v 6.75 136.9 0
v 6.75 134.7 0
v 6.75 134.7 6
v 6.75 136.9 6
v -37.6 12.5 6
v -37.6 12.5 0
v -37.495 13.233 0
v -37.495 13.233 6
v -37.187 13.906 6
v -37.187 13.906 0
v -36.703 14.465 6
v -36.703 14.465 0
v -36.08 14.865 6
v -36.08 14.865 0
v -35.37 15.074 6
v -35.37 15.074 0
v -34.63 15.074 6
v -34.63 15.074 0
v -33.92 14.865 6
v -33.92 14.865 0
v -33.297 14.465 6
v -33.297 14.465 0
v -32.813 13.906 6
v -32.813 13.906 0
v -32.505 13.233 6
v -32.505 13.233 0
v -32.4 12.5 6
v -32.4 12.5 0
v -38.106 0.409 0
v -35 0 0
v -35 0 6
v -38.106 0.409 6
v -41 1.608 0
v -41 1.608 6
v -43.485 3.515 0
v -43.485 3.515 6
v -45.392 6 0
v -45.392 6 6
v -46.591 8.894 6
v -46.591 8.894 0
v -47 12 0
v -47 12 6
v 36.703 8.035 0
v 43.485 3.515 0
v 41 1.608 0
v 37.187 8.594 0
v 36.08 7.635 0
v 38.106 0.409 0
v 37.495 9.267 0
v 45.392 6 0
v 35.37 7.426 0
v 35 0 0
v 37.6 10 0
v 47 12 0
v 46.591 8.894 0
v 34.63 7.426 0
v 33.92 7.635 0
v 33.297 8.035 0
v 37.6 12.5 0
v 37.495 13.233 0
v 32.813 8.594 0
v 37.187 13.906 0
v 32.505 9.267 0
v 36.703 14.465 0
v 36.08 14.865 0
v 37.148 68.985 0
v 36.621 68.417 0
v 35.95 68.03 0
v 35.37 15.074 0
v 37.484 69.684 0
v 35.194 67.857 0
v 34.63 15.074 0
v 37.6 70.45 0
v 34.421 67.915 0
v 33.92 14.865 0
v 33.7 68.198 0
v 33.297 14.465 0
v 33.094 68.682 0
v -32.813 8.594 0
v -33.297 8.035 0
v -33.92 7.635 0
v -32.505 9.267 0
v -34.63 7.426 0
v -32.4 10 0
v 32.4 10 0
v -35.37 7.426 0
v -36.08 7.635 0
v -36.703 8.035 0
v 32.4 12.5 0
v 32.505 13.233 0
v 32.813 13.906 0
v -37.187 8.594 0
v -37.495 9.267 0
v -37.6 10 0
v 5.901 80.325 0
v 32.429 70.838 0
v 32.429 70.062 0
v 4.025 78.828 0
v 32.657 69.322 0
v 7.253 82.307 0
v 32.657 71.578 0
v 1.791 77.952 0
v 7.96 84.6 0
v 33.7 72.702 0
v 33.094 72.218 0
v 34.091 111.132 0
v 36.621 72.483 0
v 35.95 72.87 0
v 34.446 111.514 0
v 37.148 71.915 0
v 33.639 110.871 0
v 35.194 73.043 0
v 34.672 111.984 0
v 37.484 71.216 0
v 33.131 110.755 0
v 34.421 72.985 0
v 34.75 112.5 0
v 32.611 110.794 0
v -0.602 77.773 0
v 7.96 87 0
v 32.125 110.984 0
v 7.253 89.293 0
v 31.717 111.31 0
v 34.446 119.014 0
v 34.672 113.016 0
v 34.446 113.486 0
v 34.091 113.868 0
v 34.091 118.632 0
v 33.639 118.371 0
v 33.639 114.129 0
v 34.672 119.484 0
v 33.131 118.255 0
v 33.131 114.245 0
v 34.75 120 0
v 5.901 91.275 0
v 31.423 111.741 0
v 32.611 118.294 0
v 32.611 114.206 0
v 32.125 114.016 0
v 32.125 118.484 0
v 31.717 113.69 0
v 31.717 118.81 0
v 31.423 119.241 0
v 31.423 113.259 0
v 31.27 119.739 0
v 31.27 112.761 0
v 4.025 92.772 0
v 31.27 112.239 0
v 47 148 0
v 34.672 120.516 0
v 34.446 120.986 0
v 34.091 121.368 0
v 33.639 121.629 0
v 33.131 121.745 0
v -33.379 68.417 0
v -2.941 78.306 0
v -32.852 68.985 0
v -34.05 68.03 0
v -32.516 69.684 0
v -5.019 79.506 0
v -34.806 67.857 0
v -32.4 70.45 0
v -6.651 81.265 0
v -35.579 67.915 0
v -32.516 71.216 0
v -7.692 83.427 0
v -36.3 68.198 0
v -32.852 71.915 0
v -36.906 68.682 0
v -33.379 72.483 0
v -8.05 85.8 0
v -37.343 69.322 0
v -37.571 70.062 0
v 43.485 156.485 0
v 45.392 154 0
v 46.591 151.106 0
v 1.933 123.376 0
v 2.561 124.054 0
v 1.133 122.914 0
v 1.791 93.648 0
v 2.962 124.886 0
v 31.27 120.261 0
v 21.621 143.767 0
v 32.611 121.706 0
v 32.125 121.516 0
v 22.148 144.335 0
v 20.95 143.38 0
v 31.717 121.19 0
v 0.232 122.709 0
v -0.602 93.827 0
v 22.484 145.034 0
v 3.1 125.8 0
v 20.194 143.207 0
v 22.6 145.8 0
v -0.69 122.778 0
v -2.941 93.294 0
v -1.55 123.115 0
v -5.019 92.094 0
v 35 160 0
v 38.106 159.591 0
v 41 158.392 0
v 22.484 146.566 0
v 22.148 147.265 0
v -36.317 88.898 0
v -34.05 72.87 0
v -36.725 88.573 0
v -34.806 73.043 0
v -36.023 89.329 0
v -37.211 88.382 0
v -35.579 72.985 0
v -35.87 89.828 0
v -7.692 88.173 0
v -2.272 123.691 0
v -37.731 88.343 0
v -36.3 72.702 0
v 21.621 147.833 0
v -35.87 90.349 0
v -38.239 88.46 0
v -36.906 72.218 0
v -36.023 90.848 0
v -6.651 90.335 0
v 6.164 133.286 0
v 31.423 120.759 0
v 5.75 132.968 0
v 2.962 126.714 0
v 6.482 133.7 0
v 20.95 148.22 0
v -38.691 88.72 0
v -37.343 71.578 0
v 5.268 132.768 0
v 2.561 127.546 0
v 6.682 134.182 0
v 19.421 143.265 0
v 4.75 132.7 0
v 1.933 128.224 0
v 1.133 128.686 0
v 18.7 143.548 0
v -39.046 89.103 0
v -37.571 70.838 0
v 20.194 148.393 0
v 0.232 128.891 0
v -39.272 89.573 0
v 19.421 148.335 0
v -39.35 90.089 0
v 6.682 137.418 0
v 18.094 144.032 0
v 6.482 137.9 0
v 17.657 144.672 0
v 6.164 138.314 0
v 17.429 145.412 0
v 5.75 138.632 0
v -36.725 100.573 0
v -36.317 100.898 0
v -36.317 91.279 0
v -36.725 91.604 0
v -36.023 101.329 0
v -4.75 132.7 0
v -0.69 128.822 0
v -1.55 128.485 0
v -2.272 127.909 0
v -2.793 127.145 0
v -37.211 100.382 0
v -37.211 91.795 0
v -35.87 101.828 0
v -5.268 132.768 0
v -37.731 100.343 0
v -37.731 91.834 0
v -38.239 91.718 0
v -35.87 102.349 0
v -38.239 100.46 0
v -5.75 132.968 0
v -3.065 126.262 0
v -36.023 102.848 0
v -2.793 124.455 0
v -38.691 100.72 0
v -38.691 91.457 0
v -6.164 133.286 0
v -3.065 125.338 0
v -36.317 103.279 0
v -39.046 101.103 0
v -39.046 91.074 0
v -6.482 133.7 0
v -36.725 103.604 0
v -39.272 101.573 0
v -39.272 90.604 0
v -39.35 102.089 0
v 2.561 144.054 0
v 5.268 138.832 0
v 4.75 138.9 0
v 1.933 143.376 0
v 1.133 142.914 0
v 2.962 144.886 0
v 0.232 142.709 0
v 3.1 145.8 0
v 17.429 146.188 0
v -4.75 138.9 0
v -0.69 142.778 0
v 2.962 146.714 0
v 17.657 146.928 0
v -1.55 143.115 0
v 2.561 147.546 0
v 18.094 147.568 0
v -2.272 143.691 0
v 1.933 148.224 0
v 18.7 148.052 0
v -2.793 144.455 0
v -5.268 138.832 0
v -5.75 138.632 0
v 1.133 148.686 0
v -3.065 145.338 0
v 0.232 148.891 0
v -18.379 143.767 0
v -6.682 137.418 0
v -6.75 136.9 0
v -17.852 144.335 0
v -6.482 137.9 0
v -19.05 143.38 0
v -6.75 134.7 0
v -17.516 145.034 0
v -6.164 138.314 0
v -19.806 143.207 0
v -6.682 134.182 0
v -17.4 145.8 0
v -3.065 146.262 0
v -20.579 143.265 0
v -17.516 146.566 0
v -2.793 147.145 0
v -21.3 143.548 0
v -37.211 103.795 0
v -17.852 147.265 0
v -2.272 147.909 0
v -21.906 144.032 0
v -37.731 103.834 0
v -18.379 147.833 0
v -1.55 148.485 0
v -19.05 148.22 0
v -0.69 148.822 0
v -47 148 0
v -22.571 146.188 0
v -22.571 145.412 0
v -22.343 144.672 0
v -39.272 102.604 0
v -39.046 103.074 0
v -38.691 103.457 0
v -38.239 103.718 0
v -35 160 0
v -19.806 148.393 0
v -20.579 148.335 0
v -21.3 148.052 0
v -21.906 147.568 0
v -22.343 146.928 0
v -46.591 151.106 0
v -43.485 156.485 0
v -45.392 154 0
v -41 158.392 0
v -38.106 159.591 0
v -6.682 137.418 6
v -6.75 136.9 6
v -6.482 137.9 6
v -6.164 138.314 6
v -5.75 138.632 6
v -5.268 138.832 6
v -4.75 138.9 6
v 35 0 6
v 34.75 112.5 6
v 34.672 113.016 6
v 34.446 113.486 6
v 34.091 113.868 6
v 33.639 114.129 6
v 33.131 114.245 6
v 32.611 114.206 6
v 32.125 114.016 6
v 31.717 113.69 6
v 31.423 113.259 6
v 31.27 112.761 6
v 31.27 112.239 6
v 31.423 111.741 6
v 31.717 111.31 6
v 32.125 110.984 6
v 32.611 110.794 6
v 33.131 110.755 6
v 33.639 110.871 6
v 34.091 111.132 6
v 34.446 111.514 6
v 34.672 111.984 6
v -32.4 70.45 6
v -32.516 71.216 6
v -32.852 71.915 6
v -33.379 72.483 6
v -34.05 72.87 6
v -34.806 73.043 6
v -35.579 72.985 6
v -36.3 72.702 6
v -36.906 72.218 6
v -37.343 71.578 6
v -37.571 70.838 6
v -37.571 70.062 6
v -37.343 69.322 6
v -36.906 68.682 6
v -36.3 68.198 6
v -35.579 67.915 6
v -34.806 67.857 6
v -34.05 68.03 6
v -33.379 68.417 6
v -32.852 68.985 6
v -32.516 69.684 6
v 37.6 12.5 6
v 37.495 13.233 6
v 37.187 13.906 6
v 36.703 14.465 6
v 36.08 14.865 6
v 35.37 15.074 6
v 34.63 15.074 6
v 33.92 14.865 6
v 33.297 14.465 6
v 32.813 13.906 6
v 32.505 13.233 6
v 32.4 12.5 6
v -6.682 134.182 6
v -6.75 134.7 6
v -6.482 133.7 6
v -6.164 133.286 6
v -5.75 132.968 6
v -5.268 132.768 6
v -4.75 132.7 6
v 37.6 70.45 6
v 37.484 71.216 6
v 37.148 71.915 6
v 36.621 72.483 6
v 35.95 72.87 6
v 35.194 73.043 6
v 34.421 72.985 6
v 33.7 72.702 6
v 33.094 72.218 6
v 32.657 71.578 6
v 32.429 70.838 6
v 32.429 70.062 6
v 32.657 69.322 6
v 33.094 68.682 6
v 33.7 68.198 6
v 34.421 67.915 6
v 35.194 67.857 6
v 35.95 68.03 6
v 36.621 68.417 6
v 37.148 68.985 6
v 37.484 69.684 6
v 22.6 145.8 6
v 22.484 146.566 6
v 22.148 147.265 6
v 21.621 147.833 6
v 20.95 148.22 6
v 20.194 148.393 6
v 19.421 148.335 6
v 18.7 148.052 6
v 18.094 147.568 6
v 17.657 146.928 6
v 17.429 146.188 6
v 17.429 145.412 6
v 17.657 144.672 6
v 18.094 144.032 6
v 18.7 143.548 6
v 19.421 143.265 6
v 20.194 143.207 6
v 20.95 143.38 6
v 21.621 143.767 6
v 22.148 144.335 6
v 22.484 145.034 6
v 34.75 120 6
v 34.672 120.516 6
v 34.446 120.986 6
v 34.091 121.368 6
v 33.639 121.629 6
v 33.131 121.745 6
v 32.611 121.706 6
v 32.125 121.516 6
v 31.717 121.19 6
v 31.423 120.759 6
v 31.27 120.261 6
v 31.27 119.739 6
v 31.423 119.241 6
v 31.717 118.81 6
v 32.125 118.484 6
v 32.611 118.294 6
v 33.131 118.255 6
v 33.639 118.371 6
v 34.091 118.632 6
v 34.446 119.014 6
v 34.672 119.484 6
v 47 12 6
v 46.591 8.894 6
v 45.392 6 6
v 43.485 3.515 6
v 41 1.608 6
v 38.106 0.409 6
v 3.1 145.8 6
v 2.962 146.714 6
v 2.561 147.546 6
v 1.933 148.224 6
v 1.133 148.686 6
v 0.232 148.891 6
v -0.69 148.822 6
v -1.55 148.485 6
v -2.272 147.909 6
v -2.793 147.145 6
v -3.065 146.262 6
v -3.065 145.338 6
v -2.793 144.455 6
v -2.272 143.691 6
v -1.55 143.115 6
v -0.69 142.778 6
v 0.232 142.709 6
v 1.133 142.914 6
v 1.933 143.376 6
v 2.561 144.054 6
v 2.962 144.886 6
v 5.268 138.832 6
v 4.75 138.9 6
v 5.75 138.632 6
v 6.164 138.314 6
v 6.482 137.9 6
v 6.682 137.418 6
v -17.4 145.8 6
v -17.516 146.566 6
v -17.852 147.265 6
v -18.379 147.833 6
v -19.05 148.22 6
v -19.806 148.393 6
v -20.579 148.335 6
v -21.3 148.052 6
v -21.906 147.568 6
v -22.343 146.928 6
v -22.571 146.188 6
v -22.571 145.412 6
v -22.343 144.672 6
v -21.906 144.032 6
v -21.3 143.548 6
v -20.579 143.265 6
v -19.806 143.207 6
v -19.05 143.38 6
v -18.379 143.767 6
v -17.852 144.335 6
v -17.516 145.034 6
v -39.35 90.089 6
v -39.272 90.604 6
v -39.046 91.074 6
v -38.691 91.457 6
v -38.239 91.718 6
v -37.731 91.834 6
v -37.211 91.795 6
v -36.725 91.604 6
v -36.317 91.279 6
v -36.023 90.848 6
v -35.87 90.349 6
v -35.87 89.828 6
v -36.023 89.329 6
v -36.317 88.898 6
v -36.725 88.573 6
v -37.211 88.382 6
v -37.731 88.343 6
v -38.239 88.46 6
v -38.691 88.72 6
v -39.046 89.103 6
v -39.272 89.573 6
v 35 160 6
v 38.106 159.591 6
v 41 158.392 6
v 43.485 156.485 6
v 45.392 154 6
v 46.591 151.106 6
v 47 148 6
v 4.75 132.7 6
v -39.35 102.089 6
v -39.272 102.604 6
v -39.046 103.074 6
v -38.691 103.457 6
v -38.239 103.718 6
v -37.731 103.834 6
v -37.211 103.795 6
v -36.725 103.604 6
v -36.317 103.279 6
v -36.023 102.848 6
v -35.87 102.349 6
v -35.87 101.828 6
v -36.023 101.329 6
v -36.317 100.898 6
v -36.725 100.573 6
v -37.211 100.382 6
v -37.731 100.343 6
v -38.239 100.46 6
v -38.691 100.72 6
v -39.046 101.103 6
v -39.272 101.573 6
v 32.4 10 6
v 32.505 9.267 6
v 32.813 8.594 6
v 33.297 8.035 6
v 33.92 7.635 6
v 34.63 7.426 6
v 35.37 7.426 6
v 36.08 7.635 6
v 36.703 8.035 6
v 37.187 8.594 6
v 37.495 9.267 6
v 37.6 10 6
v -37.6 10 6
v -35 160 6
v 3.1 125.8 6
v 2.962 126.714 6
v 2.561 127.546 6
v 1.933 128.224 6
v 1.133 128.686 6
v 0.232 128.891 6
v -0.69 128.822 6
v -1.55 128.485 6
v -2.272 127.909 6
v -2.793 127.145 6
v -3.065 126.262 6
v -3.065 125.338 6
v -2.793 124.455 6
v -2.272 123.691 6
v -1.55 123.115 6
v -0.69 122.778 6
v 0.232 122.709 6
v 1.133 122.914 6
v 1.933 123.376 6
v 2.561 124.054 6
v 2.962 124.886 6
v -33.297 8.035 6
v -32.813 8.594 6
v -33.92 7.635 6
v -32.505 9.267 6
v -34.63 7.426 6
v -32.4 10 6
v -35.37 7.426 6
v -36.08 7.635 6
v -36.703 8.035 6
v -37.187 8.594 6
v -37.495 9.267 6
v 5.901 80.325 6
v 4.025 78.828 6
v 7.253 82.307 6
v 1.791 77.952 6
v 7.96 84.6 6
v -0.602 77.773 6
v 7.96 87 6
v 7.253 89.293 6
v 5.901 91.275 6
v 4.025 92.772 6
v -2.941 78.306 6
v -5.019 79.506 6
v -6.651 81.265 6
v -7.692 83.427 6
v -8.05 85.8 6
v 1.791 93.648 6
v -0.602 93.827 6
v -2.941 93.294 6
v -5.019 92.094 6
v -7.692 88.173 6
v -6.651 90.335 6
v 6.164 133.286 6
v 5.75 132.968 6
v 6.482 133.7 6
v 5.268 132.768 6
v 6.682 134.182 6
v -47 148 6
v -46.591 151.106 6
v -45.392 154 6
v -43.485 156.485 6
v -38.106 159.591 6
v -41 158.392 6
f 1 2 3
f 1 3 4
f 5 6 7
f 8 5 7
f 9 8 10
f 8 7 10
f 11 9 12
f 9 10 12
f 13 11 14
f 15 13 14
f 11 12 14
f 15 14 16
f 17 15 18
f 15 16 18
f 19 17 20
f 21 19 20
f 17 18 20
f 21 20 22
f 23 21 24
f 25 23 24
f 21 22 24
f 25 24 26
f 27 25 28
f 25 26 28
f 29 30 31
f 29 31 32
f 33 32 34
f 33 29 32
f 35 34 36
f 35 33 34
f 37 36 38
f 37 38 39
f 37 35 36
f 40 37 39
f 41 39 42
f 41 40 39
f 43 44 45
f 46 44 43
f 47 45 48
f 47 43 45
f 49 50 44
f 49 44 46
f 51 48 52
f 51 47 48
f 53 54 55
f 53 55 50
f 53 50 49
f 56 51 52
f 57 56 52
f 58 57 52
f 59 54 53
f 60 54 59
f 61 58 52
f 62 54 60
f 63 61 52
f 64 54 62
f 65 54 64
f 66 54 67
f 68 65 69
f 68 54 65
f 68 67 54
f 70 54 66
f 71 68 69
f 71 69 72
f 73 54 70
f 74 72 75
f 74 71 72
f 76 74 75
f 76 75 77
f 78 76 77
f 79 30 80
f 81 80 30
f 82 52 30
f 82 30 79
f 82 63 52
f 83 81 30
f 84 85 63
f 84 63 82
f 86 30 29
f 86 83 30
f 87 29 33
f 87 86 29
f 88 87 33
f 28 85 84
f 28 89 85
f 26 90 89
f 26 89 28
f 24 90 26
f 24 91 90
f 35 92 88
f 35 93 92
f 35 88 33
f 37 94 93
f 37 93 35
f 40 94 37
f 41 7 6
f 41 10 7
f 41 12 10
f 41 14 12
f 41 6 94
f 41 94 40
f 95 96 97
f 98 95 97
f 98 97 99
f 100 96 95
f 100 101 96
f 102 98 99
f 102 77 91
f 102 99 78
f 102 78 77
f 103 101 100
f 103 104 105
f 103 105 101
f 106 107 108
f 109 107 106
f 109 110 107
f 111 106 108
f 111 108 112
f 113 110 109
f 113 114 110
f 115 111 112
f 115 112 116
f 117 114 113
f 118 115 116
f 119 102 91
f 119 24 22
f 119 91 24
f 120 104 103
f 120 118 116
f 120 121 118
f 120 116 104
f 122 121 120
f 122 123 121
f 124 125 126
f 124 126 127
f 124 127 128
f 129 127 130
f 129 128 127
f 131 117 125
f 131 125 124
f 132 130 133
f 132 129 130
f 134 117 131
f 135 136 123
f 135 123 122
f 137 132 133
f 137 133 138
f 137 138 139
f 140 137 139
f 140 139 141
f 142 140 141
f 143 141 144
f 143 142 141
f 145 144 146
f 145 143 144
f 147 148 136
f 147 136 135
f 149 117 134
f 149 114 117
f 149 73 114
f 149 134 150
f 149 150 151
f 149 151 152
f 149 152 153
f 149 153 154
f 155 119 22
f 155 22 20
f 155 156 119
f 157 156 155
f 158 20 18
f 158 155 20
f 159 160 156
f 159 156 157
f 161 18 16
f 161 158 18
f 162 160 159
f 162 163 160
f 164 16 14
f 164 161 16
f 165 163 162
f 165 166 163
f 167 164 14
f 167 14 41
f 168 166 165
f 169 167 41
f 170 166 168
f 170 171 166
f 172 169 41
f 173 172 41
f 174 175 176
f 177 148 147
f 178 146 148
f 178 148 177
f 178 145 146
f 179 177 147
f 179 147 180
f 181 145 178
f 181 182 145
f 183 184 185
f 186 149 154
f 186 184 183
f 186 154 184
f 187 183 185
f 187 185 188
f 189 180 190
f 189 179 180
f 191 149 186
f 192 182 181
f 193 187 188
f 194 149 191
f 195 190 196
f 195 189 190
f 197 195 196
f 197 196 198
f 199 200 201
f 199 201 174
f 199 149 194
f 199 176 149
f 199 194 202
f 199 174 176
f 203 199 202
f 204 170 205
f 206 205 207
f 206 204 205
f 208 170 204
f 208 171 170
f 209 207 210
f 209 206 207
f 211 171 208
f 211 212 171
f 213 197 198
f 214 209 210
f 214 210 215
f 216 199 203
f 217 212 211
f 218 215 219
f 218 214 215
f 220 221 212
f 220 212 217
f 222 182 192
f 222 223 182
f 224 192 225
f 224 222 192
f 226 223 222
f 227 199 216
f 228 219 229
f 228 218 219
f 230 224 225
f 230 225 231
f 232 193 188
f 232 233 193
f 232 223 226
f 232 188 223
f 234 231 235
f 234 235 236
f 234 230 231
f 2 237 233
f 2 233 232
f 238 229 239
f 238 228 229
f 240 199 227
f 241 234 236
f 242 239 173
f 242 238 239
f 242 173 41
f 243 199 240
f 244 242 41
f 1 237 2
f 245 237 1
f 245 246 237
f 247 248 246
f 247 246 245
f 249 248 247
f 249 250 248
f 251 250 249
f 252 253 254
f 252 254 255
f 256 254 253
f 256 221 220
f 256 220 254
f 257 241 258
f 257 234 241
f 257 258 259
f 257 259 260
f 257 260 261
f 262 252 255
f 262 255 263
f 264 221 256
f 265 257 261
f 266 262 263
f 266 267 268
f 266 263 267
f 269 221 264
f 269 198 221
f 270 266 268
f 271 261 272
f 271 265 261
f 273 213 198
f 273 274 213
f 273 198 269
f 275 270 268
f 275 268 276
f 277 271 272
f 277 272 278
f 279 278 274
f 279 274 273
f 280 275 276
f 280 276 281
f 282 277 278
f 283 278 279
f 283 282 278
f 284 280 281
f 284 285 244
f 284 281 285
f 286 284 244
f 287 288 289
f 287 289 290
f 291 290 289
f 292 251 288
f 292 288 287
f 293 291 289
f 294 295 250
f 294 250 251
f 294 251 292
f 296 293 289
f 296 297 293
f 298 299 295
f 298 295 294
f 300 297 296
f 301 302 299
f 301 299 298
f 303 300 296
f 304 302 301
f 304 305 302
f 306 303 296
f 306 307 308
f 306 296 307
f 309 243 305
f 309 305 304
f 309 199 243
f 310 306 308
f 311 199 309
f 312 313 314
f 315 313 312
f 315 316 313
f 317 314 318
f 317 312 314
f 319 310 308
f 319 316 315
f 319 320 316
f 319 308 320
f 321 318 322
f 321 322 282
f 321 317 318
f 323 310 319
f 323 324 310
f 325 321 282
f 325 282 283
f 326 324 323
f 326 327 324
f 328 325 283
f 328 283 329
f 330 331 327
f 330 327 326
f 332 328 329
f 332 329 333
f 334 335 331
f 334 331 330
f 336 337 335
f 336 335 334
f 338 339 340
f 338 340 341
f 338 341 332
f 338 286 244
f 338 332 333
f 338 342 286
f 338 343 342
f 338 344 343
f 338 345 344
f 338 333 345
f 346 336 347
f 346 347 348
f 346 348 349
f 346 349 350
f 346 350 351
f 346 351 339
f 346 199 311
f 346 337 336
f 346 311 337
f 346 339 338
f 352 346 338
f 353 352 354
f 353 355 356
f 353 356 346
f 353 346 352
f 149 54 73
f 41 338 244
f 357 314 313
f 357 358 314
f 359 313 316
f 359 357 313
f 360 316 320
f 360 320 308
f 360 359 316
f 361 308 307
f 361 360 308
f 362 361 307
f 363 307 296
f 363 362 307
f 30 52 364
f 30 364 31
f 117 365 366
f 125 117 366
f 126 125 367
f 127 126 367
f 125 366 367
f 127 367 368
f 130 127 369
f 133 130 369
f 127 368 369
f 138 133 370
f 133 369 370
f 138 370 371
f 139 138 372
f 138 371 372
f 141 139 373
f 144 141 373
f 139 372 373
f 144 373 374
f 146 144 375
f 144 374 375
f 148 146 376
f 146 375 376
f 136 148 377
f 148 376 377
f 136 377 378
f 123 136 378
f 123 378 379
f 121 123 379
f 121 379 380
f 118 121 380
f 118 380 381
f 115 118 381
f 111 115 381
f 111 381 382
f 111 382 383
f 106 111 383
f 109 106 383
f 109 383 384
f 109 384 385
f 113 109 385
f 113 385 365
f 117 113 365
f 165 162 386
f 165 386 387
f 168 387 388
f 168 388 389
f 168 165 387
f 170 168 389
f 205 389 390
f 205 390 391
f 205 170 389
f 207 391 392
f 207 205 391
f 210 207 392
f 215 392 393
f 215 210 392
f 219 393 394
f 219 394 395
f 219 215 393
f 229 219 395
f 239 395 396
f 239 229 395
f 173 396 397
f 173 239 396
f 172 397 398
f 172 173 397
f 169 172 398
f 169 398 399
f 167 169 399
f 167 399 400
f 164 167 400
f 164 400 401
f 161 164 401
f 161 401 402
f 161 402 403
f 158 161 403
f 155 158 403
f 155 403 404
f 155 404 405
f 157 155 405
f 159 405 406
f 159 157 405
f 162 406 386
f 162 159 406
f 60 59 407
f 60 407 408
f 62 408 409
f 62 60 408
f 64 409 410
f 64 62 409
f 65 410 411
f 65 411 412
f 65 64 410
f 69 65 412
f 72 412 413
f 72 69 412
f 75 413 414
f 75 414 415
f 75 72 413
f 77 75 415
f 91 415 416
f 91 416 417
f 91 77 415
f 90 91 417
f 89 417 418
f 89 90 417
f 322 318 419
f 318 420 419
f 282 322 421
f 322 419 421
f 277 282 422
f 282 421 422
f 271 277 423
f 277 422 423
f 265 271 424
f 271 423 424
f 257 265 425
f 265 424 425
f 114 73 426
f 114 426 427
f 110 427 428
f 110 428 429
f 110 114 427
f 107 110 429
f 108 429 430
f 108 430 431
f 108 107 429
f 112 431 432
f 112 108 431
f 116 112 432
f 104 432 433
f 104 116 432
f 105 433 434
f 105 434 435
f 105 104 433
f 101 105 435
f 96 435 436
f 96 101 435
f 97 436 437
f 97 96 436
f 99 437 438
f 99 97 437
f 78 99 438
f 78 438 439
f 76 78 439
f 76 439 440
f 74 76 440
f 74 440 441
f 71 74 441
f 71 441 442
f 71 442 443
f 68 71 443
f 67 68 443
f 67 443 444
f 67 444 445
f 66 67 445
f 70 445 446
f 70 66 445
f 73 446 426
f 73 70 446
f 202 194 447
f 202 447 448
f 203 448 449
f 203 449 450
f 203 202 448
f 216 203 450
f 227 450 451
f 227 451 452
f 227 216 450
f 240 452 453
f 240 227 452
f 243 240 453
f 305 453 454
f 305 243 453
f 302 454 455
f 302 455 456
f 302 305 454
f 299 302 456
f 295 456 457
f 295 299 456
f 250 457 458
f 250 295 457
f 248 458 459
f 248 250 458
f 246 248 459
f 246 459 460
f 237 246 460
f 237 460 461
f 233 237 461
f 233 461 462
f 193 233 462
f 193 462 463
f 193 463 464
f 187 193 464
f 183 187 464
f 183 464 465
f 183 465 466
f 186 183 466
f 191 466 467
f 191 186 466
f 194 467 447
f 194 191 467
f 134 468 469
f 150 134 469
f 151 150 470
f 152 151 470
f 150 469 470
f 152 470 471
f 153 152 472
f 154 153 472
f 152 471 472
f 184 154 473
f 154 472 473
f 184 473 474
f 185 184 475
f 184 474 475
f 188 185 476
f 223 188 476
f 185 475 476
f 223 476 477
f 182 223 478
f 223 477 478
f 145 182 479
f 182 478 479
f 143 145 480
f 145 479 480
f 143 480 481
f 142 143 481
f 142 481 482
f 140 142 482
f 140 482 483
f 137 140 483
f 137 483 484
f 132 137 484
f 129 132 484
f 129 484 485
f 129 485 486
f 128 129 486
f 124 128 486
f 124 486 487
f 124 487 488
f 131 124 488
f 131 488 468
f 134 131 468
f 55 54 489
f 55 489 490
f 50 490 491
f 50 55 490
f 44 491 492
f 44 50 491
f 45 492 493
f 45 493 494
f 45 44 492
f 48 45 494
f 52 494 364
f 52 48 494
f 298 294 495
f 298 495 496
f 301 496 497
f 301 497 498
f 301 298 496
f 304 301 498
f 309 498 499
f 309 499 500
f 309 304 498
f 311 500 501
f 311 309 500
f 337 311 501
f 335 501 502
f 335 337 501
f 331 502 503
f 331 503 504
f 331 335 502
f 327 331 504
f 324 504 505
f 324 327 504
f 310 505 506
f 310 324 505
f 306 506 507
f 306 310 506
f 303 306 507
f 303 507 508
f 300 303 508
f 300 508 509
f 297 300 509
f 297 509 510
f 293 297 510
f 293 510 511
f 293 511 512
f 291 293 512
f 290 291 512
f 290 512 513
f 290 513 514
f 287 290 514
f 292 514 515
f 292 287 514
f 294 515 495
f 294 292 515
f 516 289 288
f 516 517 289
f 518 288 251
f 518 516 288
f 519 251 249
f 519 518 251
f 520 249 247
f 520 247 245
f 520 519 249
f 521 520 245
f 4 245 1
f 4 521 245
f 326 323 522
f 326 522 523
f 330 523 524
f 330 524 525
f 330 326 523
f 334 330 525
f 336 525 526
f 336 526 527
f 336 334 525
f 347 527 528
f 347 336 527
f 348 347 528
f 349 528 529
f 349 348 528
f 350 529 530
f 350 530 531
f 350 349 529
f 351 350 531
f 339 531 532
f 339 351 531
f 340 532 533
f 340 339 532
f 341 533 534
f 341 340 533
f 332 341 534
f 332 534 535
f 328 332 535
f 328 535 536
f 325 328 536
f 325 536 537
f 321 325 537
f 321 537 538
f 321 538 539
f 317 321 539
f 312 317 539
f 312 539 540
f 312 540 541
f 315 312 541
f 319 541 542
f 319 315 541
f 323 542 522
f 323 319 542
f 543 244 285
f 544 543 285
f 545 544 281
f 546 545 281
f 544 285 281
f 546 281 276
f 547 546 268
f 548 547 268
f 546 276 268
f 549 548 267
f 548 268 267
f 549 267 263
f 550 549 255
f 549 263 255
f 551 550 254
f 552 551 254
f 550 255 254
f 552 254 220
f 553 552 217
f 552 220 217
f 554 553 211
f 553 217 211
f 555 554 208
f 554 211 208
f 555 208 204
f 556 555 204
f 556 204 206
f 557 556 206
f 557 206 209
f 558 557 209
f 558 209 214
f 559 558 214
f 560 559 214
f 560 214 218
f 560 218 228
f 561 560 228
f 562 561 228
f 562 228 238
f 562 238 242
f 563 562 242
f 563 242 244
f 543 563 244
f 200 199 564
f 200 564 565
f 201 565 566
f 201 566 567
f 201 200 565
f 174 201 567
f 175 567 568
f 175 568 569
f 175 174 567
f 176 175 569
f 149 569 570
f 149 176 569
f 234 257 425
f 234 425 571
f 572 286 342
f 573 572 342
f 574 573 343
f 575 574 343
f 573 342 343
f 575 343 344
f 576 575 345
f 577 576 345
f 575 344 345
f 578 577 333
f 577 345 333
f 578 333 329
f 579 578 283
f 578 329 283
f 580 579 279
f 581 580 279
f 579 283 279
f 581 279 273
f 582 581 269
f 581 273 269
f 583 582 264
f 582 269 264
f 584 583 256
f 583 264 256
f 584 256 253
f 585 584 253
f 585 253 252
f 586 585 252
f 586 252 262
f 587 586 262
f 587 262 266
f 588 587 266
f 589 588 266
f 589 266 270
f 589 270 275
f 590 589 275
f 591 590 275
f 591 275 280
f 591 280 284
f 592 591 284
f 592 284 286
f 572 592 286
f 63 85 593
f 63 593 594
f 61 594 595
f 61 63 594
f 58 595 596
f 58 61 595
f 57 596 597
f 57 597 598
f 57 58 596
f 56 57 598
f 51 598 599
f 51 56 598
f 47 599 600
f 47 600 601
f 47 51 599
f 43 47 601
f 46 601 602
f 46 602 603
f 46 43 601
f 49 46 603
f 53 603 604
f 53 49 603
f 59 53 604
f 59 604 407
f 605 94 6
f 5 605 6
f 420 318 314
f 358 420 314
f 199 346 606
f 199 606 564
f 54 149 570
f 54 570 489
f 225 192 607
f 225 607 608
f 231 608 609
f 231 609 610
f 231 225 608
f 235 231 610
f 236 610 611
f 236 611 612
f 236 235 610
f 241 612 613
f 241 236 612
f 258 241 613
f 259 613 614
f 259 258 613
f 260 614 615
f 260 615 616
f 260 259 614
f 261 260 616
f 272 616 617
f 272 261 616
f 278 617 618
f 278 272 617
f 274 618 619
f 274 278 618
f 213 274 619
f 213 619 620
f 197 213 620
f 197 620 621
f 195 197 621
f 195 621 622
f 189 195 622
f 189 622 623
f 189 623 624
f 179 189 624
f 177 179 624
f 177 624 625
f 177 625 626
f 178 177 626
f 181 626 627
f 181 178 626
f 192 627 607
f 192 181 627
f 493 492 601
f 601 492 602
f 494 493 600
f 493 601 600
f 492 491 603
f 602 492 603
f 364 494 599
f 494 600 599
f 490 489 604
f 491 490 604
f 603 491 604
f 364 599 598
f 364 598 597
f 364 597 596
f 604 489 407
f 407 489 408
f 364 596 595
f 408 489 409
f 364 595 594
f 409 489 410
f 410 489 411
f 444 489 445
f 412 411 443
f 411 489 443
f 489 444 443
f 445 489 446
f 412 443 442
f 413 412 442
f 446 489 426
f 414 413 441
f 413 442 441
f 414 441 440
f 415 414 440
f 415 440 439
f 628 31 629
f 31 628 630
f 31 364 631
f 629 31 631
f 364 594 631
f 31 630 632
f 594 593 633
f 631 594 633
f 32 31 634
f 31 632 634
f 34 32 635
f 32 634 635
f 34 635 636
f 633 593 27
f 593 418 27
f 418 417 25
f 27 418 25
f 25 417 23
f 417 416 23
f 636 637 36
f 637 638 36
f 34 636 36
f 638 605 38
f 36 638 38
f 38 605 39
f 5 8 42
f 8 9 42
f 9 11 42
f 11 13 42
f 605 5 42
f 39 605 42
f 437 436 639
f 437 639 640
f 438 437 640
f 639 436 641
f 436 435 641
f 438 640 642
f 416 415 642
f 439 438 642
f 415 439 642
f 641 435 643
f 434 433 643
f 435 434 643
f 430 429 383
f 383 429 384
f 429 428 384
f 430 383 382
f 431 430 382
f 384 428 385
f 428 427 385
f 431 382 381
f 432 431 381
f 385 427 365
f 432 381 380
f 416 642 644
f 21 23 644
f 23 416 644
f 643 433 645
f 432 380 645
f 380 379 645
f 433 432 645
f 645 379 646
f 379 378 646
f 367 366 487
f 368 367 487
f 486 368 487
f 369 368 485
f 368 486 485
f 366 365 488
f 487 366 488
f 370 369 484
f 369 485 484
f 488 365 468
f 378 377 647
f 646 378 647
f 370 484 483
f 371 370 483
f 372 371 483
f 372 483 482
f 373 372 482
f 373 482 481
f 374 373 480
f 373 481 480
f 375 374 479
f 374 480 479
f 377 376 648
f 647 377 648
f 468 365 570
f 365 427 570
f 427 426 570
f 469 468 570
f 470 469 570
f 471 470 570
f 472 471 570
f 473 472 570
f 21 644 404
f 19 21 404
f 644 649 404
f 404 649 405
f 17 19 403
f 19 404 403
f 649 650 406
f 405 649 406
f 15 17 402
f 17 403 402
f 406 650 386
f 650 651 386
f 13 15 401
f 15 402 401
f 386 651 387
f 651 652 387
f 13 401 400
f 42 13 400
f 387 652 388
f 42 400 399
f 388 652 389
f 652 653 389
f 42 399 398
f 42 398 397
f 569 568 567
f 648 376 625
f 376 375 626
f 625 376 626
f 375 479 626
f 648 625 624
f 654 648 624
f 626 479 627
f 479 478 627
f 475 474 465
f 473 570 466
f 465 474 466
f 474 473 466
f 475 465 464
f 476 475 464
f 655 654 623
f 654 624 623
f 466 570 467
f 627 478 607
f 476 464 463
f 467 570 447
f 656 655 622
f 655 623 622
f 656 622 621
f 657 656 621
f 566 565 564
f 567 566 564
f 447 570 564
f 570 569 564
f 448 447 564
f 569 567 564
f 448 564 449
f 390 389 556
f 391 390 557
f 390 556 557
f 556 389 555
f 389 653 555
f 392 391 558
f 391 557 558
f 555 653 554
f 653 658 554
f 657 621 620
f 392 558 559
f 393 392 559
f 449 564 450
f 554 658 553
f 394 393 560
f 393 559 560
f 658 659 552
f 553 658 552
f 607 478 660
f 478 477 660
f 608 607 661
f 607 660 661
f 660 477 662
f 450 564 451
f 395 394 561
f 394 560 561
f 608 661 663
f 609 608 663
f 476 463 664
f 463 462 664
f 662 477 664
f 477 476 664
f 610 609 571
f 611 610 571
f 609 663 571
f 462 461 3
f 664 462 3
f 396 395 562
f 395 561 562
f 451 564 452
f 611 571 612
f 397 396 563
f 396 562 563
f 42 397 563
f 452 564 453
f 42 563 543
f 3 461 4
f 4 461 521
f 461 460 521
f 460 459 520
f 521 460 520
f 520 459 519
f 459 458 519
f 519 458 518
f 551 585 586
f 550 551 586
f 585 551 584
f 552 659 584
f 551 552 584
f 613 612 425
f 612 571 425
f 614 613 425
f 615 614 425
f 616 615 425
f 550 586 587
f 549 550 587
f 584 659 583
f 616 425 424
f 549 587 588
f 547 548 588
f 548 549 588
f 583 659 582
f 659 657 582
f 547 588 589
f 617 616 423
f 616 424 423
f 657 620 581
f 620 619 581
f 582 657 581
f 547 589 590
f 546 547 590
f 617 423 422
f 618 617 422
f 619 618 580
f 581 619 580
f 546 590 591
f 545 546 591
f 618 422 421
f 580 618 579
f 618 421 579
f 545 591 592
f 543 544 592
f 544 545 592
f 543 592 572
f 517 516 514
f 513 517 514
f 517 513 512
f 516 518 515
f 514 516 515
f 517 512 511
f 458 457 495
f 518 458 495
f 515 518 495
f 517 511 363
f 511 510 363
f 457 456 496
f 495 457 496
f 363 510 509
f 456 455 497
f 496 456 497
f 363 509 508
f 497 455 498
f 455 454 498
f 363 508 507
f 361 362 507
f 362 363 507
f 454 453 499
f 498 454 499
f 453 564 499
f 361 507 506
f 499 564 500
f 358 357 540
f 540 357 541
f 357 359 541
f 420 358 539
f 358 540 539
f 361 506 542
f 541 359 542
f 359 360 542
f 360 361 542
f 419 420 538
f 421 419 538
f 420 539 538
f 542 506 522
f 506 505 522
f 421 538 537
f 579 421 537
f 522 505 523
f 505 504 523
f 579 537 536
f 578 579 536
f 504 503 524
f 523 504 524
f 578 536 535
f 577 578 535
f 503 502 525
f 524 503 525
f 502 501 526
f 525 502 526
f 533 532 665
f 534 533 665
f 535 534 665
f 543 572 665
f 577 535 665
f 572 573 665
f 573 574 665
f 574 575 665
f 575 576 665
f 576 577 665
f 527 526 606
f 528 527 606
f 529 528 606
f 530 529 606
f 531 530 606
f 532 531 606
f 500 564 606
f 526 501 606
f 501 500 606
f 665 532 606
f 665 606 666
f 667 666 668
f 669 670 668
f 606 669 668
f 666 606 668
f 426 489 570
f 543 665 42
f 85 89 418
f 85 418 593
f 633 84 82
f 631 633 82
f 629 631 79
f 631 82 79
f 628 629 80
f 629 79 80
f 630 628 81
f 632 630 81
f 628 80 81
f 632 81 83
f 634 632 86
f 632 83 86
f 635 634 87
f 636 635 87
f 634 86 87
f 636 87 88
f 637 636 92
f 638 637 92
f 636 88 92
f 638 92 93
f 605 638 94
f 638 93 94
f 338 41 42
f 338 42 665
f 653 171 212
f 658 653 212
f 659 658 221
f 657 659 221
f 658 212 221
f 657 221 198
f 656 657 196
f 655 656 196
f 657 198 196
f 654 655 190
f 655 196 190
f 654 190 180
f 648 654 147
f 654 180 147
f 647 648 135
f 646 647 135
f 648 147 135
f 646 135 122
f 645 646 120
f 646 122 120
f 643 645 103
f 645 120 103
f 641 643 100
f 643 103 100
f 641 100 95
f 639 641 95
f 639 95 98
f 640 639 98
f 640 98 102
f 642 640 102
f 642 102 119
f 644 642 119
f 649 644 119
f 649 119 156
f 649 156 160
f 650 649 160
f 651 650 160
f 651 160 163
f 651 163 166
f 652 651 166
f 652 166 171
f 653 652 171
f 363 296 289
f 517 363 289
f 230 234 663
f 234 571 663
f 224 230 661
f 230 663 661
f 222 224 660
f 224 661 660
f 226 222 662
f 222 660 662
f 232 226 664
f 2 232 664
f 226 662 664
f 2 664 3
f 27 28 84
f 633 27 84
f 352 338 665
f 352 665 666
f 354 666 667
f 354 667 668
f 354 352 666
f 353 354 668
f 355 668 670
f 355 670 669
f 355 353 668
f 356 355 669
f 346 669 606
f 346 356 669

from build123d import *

# Parameters (mm, degrees)
MODEL_R           = 3.1
MODEL_R_2         = 2.6
MODEL_W           = 13.5
MODEL_H           = 6.2
BASE_DEPTH        = 6
SKETCH_1_R        = 8.05
BEARINGHOLE_DEPTH = 10
SKETCH1_R         = 1.75
SENSORMOUNT_DEPTH = 10
SKETCH3_R         = 1.75
CABLEMOUNT_DEPTH  = 10
FILLETCABLESLOT_R = 2


with BuildPart() as part:
    # Model → Base (new body)
    with BuildSketch(Plane.XY):
        with BuildLine():
            Line((-35, 160), (35, 160))
            ThreePointArc((35, 160), (43.485281374, 156.485281374), (47, 148))
            Line((47, 148), (47, 12))
            ThreePointArc((47, 12), (43.485281374, 3.514718626), (35, 0))
            Line((35, 0), (-35, 0))
            ThreePointArc((-35, 0), (-43.485281374, 3.514718626), (-47, 12))
            Line((-47, 12), (-47, 148))
            ThreePointArc((-47, 148), (-43.485281374, 156.485281374), (-35, 160))
        make_face()
        with Locations((0, 145.8)):
            Circle(MODEL_R, mode=Mode.SUBTRACT)
        with Locations((-20, 145.8)):
            Circle(MODEL_R_2, mode=Mode.SUBTRACT)
        with Locations((20, 145.8)):
            Circle(MODEL_R_2, mode=Mode.SUBTRACT)
        with Locations((-35, 70.45)):
            Circle(MODEL_R_2, mode=Mode.SUBTRACT)
        with Locations((0, 125.8)):
            Circle(MODEL_R, mode=Mode.SUBTRACT)
        with Locations((35, 70.45)):
            Circle(MODEL_R_2, mode=Mode.SUBTRACT)
        with BuildLine():
            Line((-32.4, 12.5), (-32.4, 10))
            ThreePointArc((-32.4, 10), (-35, 7.4), (-37.6, 10))
            Line((-37.6, 10), (-37.6, 12.5))
            ThreePointArc((-37.6, 12.5), (-35, 15.1), (-32.4, 12.5))
        make_face(mode=Mode.SUBTRACT)
        with BuildLine():
            Line((32.4, 12.5), (32.4, 10))
            ThreePointArc((32.4, 10), (35, 7.4), (37.6, 10))
            Line((37.6, 10), (37.6, 12.5))
            ThreePointArc((37.6, 12.5), (35, 15.1), (32.4, 12.5))
        make_face(mode=Mode.SUBTRACT)
        with Locations((0, 135.8)):
            Rectangle(MODEL_W, MODEL_H, mode=Mode.SUBTRACT)
    extrude(amount=BASE_DEPTH)

    # Эскиз1 → BearingHole (cut)
    with BuildSketch(Plane(origin=(0, 0, 0), x_dir=(-1, 0, 0), z_dir=(0, 0, -1))):
        with Locations((0, 85.8)):
            Circle(SKETCH_1_R)
    extrude(amount=-BEARINGHOLE_DEPTH, mode=Mode.SUBTRACT)

    # Sketch1 → SensorMount (cut)
    with BuildSketch(Plane.XY.offset(6)):
        with Locations((33, 120)):
            Circle(SKETCH1_R)
        with Locations((33, 112.5)):
            Circle(SKETCH1_R)
    extrude(amount=-SENSORMOUNT_DEPTH, mode=Mode.SUBTRACT)

    # Sketch3 → CableMount (cut)
    with BuildSketch(Plane(origin=(0, 0, 0), x_dir=(-1, 0, 0), z_dir=(0, 0, -1))):
        with Locations((37.6, 90.08855339)):
            Circle(SKETCH3_R)
        with Locations((37.6, 102.08855339)):
            Circle(SKETCH3_R)
    extrude(amount=-CABLEMOUNT_DEPTH, mode=Mode.SUBTRACT)

    # FilletCableSlot
    filletcableslot_edges = [part.edges().sort_by_distance(p)[0] for p in [
        (6.75, 132.7, 3),
        (6.75, 138.9, 3),
        (-6.75, 138.9, 3),
        (-6.75, 132.7, 3),
    ]]
    fillet(filletcableslot_edges, radius=FILLETCABLESLOT_R)


solid = part.part
